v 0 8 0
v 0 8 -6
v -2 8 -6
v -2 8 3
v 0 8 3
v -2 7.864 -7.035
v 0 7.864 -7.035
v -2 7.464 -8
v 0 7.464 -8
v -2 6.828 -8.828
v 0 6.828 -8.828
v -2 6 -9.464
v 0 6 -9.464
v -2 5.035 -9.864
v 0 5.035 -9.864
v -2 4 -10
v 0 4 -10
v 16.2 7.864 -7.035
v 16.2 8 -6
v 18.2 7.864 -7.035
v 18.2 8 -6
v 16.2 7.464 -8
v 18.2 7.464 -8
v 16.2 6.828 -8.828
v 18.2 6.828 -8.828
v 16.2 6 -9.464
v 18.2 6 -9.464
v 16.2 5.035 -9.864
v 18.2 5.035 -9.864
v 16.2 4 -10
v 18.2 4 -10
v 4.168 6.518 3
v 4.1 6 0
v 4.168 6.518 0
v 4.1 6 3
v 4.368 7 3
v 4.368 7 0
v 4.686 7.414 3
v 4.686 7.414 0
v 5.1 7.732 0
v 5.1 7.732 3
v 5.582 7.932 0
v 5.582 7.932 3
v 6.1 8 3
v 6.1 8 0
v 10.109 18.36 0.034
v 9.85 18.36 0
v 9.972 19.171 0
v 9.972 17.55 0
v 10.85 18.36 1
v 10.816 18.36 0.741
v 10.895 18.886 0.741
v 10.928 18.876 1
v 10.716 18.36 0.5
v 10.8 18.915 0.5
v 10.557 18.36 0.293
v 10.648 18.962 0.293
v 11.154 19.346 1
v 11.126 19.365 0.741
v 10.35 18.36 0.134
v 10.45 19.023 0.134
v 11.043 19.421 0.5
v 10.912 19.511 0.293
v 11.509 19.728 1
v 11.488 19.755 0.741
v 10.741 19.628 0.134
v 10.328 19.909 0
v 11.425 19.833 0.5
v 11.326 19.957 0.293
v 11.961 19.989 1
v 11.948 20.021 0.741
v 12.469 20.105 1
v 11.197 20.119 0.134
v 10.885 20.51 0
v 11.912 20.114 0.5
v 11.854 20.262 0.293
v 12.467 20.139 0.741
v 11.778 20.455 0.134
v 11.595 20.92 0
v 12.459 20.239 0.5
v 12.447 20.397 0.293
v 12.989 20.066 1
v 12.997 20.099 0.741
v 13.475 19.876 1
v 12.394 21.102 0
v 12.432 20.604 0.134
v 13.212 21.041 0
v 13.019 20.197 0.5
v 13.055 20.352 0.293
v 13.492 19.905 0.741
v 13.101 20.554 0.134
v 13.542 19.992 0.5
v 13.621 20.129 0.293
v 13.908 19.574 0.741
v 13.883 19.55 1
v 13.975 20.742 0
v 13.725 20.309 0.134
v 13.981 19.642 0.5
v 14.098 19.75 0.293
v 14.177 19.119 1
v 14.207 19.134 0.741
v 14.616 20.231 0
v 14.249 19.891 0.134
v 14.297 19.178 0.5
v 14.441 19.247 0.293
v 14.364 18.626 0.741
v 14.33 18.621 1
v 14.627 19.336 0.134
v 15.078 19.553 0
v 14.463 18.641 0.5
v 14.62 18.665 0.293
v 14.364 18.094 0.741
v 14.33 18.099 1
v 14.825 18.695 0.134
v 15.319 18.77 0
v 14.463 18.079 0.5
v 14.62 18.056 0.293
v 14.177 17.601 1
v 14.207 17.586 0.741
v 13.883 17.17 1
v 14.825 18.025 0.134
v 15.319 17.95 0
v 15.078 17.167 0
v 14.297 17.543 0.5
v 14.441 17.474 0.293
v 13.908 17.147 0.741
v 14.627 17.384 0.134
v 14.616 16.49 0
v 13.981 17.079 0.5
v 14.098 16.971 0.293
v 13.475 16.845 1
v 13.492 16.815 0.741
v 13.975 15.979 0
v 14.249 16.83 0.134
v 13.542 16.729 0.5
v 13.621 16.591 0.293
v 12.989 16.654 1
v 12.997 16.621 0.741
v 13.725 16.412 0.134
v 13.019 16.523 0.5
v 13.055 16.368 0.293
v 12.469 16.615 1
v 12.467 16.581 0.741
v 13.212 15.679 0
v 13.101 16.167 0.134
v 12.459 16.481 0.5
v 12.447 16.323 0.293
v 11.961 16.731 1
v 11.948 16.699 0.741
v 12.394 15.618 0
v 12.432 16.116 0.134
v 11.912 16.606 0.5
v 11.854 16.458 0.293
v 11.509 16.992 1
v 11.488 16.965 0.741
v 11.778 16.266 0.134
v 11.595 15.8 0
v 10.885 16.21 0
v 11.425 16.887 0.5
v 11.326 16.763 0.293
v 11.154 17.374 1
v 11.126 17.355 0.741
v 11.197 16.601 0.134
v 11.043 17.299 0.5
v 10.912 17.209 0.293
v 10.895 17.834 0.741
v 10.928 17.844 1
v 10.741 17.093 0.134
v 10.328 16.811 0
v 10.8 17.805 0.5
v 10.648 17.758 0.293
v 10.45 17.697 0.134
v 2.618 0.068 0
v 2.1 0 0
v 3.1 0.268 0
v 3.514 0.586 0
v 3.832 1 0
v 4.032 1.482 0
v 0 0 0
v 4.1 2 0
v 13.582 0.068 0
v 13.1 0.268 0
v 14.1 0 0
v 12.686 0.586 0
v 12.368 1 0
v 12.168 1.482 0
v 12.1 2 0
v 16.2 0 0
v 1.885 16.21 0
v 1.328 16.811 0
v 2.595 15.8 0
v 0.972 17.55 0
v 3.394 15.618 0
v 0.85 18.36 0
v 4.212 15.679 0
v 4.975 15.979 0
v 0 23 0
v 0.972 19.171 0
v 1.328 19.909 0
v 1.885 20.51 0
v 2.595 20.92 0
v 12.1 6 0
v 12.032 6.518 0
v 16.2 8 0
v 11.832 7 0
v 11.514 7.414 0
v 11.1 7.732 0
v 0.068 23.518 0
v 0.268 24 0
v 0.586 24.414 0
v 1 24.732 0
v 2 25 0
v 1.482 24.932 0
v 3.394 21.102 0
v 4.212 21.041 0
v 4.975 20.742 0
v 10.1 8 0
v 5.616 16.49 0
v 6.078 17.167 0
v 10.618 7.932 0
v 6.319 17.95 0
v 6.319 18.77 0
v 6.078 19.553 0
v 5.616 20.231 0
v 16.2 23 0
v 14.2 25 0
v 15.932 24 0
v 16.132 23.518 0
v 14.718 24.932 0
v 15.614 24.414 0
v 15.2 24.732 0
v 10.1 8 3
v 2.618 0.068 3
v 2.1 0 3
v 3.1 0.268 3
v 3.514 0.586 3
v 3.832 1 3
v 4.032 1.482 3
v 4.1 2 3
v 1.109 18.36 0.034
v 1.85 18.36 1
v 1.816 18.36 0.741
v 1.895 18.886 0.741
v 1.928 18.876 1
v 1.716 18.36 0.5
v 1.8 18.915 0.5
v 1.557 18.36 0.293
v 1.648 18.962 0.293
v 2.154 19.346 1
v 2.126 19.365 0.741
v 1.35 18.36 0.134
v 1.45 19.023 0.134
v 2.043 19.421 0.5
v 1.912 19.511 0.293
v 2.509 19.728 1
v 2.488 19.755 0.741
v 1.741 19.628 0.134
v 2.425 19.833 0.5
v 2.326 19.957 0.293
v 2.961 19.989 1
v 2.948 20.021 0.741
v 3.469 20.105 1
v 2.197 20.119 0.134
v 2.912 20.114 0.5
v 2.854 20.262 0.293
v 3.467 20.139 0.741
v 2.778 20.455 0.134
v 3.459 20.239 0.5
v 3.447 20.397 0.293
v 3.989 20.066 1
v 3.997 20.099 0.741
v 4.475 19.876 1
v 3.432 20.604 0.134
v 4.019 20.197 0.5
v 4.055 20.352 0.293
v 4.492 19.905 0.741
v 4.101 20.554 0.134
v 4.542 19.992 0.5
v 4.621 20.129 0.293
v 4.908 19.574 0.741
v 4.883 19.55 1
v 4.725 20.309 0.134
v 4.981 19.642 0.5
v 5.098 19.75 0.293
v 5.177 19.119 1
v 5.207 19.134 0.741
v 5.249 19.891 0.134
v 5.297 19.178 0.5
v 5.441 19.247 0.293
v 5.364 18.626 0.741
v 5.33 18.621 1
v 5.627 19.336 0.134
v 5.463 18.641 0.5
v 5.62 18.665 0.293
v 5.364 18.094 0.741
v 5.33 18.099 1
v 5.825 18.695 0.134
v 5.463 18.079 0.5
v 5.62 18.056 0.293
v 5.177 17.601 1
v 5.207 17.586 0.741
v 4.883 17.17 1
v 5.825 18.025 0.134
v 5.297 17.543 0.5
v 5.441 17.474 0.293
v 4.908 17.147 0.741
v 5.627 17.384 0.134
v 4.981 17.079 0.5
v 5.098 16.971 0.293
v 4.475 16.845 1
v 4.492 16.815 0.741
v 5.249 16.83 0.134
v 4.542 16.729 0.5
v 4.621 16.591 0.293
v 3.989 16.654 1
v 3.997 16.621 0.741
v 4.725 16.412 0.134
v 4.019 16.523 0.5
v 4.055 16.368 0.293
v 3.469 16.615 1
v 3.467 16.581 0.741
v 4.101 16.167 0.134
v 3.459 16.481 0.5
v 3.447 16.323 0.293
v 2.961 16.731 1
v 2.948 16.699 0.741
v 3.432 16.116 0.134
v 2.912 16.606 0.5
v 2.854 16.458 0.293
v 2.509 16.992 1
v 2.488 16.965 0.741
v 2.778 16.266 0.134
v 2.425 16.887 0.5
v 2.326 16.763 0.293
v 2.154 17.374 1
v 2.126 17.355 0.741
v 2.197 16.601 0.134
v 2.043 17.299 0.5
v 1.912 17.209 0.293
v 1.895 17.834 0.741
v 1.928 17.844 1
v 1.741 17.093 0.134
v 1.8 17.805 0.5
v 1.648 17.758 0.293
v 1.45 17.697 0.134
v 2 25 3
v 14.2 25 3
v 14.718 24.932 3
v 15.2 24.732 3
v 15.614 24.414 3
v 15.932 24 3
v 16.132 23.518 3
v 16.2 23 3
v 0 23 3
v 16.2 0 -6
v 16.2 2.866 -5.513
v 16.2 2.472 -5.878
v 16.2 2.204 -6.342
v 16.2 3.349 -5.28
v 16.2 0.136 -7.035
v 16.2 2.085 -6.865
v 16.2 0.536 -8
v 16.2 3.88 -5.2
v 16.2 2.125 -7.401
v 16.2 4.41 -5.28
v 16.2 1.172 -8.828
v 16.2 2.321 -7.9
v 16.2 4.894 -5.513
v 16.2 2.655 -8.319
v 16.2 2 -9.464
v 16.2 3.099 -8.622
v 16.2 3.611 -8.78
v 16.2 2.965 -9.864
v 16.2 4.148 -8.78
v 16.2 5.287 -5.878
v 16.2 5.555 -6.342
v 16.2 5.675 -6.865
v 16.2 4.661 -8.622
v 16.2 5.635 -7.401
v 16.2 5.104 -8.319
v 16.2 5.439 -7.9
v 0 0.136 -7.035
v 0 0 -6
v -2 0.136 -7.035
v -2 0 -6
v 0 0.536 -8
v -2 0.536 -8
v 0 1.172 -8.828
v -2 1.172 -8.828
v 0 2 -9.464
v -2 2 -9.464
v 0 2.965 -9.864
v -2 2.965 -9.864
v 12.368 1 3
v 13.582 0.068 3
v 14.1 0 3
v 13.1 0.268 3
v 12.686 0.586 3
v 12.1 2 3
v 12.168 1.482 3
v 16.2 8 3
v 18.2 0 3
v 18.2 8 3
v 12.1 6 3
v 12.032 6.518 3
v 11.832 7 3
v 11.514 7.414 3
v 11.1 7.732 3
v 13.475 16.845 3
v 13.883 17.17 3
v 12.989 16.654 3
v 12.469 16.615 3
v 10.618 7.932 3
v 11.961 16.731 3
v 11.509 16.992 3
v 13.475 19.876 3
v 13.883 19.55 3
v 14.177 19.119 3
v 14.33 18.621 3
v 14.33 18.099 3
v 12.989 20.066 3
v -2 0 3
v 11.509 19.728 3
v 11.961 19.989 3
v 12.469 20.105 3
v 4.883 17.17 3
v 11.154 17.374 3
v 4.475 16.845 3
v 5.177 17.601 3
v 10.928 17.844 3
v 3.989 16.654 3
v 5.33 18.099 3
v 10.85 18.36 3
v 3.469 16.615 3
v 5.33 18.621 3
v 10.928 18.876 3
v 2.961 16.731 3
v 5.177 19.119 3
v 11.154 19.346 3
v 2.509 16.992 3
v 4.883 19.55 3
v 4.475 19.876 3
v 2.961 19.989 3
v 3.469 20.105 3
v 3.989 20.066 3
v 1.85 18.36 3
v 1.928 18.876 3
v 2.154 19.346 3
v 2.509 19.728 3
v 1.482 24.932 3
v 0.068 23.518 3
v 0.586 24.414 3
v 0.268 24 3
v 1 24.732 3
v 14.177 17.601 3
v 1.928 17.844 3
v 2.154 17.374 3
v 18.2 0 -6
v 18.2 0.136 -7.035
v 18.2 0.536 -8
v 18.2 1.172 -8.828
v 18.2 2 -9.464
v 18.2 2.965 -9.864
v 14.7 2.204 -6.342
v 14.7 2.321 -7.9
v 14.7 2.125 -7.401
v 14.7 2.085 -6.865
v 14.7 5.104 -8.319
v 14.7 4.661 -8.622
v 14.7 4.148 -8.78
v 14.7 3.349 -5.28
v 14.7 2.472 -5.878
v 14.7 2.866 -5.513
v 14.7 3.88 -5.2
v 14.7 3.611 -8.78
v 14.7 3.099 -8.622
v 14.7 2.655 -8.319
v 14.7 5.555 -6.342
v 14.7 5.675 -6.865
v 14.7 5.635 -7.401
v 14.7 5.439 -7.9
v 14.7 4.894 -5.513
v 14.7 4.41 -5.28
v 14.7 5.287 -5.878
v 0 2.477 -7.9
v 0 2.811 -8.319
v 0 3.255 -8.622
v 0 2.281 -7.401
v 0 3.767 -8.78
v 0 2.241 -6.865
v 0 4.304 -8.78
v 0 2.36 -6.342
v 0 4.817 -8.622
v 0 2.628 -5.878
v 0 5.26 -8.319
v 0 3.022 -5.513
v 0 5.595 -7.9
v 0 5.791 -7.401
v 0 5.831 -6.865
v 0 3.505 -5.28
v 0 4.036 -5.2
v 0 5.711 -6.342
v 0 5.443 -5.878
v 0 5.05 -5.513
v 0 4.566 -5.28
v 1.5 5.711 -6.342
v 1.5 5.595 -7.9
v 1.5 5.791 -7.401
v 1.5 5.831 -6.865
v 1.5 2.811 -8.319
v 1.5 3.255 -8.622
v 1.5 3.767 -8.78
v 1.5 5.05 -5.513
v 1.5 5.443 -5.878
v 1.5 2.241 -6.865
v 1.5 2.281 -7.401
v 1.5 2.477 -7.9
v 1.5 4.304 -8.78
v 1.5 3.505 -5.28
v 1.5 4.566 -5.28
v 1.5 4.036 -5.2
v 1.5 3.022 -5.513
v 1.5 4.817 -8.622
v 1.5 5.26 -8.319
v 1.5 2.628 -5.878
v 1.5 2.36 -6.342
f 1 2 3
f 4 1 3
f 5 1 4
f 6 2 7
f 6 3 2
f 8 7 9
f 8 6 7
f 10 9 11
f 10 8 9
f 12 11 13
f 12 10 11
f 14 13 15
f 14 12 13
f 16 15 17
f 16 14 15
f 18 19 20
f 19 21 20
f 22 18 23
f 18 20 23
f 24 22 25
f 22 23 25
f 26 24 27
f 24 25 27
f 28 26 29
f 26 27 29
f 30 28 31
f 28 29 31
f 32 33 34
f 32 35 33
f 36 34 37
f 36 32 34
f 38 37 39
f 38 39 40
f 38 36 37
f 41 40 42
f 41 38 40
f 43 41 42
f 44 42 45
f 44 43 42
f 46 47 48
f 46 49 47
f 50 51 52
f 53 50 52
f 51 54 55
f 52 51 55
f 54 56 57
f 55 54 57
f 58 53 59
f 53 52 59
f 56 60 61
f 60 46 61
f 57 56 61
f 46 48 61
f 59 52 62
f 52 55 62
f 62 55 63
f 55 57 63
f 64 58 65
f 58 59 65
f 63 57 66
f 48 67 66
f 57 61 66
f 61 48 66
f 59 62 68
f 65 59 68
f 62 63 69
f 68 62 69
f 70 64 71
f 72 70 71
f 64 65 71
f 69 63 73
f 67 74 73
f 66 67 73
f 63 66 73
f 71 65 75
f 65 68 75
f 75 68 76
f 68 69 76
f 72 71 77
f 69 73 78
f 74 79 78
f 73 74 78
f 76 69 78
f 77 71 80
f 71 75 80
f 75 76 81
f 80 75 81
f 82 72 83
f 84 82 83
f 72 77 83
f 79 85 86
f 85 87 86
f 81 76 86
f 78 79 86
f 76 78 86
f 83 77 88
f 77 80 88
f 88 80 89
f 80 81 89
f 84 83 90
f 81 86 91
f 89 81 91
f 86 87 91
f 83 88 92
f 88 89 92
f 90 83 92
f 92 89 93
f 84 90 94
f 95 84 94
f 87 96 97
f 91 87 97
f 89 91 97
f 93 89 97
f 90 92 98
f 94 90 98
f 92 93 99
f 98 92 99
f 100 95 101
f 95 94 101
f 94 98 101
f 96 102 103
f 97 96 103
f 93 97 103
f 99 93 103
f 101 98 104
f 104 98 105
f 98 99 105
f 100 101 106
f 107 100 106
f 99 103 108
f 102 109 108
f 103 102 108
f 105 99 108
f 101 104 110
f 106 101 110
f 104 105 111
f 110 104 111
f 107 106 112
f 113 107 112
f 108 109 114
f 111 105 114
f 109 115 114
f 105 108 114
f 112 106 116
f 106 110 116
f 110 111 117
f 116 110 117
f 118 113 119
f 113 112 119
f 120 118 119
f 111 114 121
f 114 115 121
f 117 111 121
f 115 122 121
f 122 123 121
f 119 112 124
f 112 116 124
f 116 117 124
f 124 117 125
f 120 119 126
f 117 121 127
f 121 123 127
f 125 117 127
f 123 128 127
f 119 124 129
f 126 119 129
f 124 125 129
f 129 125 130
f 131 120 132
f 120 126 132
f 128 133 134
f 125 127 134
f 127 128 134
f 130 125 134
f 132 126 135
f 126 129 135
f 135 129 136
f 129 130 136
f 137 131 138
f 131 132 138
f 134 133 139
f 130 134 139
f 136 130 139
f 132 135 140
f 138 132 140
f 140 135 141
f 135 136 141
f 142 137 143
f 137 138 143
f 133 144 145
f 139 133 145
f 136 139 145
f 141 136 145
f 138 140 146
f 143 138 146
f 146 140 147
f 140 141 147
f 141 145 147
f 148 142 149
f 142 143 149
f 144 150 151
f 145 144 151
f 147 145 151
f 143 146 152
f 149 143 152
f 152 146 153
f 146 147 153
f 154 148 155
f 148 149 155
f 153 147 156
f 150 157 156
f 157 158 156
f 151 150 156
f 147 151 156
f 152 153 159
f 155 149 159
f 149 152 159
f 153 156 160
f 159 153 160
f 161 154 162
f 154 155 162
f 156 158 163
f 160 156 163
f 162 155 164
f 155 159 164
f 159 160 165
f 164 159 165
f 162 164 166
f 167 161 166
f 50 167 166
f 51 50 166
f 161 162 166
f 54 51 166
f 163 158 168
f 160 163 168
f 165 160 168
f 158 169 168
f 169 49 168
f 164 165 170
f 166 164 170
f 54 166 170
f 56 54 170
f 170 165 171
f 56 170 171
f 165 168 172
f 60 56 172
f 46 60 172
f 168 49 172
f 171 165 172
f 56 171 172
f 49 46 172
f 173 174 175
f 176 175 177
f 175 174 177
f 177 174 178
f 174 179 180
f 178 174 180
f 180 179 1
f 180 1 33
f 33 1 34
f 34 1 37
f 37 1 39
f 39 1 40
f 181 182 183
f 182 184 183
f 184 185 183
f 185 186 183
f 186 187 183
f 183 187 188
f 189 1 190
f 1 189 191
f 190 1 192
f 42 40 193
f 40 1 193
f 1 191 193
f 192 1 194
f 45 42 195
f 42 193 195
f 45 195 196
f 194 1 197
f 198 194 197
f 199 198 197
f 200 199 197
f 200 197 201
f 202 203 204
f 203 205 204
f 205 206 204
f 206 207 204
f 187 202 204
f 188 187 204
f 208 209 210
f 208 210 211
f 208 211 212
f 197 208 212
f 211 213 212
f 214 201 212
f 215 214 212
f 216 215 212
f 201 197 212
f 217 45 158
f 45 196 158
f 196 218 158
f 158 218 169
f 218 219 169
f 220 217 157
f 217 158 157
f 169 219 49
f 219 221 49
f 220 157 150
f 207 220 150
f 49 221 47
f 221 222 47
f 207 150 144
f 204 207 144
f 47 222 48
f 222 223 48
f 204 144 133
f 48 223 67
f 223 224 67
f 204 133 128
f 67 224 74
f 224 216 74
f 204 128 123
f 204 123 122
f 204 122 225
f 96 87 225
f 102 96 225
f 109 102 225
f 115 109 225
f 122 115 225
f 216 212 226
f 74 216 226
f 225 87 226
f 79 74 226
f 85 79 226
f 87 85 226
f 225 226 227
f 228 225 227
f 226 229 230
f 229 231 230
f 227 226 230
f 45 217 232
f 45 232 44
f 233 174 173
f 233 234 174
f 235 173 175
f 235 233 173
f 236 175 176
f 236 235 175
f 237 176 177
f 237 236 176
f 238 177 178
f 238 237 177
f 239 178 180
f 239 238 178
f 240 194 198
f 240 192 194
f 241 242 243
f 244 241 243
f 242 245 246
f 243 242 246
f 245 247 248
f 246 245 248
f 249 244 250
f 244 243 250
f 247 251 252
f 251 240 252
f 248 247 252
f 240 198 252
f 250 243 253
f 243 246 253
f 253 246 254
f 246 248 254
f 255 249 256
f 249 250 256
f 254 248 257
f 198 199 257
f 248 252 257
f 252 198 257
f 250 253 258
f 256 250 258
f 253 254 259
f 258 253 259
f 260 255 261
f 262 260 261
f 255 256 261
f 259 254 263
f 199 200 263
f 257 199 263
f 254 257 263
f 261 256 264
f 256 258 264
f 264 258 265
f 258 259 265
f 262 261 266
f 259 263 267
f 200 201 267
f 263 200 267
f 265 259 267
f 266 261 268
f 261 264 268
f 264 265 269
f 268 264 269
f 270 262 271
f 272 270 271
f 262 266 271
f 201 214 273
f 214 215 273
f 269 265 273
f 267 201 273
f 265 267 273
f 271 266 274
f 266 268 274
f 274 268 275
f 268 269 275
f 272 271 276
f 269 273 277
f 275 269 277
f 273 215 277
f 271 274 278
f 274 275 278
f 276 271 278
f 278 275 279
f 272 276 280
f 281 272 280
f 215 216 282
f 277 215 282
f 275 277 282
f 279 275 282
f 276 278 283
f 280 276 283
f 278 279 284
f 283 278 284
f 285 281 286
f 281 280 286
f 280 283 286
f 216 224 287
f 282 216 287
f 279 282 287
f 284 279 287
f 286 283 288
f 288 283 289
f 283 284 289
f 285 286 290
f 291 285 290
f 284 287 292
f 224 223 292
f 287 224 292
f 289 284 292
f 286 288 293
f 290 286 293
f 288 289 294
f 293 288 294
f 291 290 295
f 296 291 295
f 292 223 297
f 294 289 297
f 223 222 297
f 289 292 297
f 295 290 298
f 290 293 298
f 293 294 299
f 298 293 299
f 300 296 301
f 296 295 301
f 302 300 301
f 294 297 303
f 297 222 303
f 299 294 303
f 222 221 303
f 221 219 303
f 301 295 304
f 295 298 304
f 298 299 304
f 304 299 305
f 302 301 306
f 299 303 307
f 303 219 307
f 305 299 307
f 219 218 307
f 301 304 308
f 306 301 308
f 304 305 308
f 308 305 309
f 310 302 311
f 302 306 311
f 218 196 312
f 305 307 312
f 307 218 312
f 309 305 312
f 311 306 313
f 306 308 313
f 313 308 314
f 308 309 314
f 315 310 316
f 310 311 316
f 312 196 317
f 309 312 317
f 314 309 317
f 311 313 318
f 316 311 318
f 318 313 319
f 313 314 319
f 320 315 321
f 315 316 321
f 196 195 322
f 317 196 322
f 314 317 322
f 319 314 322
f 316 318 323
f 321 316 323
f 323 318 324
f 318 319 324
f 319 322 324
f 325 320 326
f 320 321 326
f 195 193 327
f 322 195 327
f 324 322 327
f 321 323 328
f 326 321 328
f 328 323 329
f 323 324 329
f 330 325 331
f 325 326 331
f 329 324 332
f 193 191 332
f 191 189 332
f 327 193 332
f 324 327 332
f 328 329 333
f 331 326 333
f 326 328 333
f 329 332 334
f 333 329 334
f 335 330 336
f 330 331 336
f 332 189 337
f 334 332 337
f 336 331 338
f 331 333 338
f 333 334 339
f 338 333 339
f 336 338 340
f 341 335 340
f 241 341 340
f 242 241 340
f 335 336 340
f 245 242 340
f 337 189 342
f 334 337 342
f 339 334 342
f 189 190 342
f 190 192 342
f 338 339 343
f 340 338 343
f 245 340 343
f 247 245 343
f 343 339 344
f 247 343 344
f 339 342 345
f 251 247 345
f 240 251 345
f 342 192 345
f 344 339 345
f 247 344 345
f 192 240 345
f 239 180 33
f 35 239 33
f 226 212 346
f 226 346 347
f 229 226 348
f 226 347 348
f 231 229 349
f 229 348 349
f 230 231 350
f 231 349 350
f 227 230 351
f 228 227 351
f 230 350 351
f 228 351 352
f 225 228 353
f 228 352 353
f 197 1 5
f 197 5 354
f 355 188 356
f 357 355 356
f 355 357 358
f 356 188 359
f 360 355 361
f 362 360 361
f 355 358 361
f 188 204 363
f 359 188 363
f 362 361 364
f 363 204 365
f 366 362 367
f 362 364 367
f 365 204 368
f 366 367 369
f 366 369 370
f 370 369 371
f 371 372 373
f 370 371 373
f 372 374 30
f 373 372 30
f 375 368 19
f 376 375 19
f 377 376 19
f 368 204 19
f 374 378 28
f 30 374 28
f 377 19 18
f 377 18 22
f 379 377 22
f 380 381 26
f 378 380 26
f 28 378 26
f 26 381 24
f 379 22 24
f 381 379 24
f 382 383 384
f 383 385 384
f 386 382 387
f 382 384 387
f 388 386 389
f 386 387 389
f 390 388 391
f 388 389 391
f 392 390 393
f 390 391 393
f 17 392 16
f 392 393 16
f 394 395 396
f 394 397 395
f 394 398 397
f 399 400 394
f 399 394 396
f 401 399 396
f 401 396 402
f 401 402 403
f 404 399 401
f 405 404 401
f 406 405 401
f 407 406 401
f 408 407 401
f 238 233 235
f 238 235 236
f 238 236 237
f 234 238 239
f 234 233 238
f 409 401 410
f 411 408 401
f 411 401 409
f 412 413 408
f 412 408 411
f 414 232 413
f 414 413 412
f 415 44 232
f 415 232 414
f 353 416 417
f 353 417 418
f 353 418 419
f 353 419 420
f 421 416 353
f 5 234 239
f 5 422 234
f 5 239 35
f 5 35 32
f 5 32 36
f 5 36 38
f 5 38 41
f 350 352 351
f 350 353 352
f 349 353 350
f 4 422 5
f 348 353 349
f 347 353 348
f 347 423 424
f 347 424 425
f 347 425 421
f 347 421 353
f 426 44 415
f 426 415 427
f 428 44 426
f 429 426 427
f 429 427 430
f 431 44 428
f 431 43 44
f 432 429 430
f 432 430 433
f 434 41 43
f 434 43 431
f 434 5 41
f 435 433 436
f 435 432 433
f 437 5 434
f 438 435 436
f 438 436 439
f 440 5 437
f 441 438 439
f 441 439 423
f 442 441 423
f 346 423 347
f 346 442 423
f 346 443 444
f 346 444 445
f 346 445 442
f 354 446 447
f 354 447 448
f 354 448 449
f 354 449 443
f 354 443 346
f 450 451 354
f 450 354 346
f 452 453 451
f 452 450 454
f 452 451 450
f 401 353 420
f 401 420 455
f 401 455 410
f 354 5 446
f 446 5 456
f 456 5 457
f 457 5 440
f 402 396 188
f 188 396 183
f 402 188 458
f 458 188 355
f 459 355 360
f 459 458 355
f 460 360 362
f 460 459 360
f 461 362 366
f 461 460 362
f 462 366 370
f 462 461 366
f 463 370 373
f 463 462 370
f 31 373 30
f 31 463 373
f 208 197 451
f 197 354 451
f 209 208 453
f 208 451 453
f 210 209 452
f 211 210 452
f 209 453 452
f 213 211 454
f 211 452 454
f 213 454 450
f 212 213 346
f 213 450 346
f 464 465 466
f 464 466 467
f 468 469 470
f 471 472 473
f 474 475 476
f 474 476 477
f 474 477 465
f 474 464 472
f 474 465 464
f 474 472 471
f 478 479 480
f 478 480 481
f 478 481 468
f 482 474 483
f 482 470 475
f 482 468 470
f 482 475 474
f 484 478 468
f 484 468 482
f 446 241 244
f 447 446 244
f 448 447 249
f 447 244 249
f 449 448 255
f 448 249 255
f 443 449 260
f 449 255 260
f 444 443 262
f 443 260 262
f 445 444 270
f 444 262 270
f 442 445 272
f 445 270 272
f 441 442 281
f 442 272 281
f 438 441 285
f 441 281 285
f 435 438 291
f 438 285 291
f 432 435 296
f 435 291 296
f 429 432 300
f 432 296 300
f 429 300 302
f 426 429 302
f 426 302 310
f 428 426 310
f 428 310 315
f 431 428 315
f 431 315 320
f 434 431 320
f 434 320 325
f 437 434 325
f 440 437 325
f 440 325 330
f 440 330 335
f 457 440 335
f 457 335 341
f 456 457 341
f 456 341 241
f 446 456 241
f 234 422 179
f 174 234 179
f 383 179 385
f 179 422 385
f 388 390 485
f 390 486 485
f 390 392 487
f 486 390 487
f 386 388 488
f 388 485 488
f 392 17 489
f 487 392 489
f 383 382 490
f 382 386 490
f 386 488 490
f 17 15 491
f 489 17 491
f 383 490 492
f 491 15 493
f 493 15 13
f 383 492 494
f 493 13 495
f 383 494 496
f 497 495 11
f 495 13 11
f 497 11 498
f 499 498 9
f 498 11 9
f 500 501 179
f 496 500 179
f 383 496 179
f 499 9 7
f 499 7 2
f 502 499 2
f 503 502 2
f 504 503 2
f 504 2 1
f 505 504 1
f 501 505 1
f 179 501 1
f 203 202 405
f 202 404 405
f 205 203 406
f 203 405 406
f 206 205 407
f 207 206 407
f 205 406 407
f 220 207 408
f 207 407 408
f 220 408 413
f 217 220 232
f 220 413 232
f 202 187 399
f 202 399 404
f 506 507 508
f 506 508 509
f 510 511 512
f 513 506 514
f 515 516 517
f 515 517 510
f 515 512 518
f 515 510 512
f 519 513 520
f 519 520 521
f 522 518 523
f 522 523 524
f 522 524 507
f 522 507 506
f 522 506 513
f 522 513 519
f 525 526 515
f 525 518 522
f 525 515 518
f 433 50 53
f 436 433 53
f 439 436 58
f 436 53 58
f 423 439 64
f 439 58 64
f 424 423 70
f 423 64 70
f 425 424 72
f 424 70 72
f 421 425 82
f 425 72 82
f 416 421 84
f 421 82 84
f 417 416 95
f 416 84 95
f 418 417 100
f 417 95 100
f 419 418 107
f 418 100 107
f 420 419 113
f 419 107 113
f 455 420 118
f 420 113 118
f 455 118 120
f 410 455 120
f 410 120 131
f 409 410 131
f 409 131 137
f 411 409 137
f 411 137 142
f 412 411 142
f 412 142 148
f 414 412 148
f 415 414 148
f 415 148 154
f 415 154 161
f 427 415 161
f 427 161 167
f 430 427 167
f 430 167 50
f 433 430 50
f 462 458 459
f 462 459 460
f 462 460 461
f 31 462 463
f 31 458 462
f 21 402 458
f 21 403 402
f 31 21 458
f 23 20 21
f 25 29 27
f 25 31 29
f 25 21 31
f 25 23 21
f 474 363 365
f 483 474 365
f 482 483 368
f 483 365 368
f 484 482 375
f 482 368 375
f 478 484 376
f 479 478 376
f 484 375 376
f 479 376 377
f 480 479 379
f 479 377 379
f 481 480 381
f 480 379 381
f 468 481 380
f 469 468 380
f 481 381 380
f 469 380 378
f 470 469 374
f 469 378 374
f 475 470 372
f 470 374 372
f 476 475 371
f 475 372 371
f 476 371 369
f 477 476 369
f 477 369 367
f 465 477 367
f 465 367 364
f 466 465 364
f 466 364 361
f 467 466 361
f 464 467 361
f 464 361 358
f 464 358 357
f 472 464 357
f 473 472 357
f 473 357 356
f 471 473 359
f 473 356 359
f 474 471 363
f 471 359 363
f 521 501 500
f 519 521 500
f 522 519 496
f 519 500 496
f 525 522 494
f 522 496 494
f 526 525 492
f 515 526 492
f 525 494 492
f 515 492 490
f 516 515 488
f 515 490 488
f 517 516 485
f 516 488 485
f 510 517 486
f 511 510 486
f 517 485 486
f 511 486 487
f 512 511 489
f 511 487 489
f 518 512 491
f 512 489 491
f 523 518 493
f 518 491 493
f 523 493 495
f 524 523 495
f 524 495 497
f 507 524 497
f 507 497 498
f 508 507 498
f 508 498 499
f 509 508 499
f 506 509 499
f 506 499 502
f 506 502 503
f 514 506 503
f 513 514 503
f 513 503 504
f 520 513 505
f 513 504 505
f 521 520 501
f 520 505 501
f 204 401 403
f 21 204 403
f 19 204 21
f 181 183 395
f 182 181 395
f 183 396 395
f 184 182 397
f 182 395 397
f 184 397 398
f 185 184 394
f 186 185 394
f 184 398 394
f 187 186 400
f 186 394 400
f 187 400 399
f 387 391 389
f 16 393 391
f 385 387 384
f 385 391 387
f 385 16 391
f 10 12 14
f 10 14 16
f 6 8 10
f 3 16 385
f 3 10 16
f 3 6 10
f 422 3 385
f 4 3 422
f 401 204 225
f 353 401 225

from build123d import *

# Parameters (mm, degrees)
ESQUISSE1_W             = 16.2
ESQUISSE1_H             = 25
BOSS_EXTRU_1_DEPTH      = 3
ESQUISSE2_W             = 13
ESQUISSE2_H             = 8
BOSS_EXTRU_2_DEPTH      = 2
ESQUISSE3_R             = 1.8
BOSS_EXTRU_3_DEPTH      = 1.5
ESQUISSE5_W             = 13
ESQUISSE5_H             = 8
BOSS_EXTRU_4_DEPTH      = 2
ESQUISSE6_R             = 1.8
BOSS_EXTRU_5_DEPTH      = 1.5
ENL_V_MAT_EXTRU_1_REACH = 34.5
ESQUISSE7_W             = 8
ESQUISSE7_H             = 8
ENL_V_MAT_EXTRU_2_REACH = 34.5
ESQUISSE8_R             = 1.75
CONG_1_R                = 1
CONG_2_R                = 4
CONG_3_R                = 2
CONG_4_R                = 2


with BuildPart() as part:
    # Esquisse1 → Boss.-Extru.1 (new body)
    with BuildSketch(Plane.XY):
        with Locations((8.1, 12.5)):
            Rectangle(ESQUISSE1_W, ESQUISSE1_H)
    extrude(amount=BOSS_EXTRU_1_DEPTH)

    # Esquisse2 → Boss.-Extru.2 (add)
    with BuildSketch(Plane.ZY):
        with Locations((-3.5, 4)):
            Rectangle(ESQUISSE2_W, ESQUISSE2_H)
    extrude(amount=BOSS_EXTRU_2_DEPTH)

    # Esquisse3 → Boss.-Extru.3 (add)
    with BuildSketch(Plane(origin=(0, 0, 0), x_dir=(0, 0, -1), z_dir=(1, 0, 0))):
        with Locations(Location((7, 4.035774971, 0), (0, 0, 180))):
            Circle(ESQUISSE3_R)
    extrude(amount=BOSS_EXTRU_3_DEPTH)

    # Esquisse5 → Boss.-Extru.4 (add)
    with BuildSketch(Plane(origin=(16.2, 0, 0), x_dir=(0, 0, -1), z_dir=(1, 0, 0))):
        with Locations((3.5, 4)):
            Rectangle(ESQUISSE5_W, ESQUISSE5_H)
    extrude(amount=BOSS_EXTRU_4_DEPTH)

    # Esquisse6 → Boss.-Extru.5 (add)
    with BuildSketch(Plane.ZY.offset(-16.2)):
        with Locations((-7, 3.879731229)):
            Circle(ESQUISSE6_R)
    extrude(amount=BOSS_EXTRU_5_DEPTH)

    # Esquisse7 → Enlèv. mat.-Extru.1 (cut, up to next)
    with BuildSketch(Plane(origin=(0, 0, 0), x_dir=(-1, 0, 0), z_dir=(0, 0, -1)), mode=Mode.PRIVATE) as enl_v_mat_extru_1_sk1:
        with Locations((-8.1, 4)):
            Rectangle(ESQUISSE7_W, ESQUISSE7_H)
    enl_v_mat_extru_1_tool1 = extrude(enl_v_mat_extru_1_sk1.sketch, amount=-ENL_V_MAT_EXTRU_1_REACH, mode=Mode.PRIVATE) & part.part
    add(enl_v_mat_extru_1_tool1.solids().sort_by_distance((8.1, 4, 0))[0], mode=Mode.SUBTRACT)

    # Esquisse8 → Enlèv. mat.-Extru.2 (cut, up to next)
    with BuildSketch(Plane(origin=(0, 0, 0), x_dir=(-1, 0, 0), z_dir=(0, 0, -1)), mode=Mode.PRIVATE) as enl_v_mat_extru_2_sk1:
        with Locations((-12.6, 18.360124913)):
            Circle(ESQUISSE8_R)
    enl_v_mat_extru_2_tool1 = extrude(enl_v_mat_extru_2_sk1.sketch, amount=-ENL_V_MAT_EXTRU_2_REACH, mode=Mode.PRIVATE) & part.part
    # Esquisse8 → Enlèv. mat.-Extru.2 (cut, up to next)
    with BuildSketch(Plane(origin=(0, 0, 0), x_dir=(-1, 0, 0), z_dir=(0, 0, -1)), mode=Mode.PRIVATE) as enl_v_mat_extru_2_sk2:
        with Locations((-3.6, 18.360124913)):
            Circle(ESQUISSE8_R)
    enl_v_mat_extru_2_tool2 = extrude(enl_v_mat_extru_2_sk2.sketch, amount=-ENL_V_MAT_EXTRU_2_REACH, mode=Mode.PRIVATE) & part.part
    add(enl_v_mat_extru_2_tool1.solids().sort_by_distance((12.6, 18.360125, 0))[0], mode=Mode.SUBTRACT)
    add(enl_v_mat_extru_2_tool2.solids().sort_by_distance((3.6, 18.360125, 0))[0], mode=Mode.SUBTRACT)

    # Congé1
    cong_1_edges = [part.edges().sort_by_distance(p)[0] for p in [
        (14.35, 18.360124913, 0),
        (5.35, 18.360124913, 0),
    ]]
    fillet(cong_1_edges, radius=CONG_1_R)

    # Congé2
    cong_2_edges = [part.edges().sort_by_distance(p)[0] for p in [
        (-1, 8, -10),
        (-1, 0, -10),
        (17.2, 0, -10),
        (17.2, 8, -10),
    ]]
    fillet(cong_2_edges, radius=CONG_2_R - 0.0001)  # a hair under: the kernel refuses the full size

    # Congé3
    cong_3_edges = [part.edges().sort_by_distance(p)[0] for p in [
        (12.1, 0, 1.5),
        (12.1, 8, 1.5),
        (4.1, 8, 1.5),
        (4.1, 0, 1.5),
    ]]
    fillet(cong_3_edges, radius=CONG_3_R)

    # Congé4
    cong_4_edges = [part.edges().sort_by_distance(p)[0] for p in [
        (0, 25, 1.5),
        (16.2, 25, 1.5),
    ]]
    fillet(cong_4_edges, radius=CONG_4_R)


solid = part.part
